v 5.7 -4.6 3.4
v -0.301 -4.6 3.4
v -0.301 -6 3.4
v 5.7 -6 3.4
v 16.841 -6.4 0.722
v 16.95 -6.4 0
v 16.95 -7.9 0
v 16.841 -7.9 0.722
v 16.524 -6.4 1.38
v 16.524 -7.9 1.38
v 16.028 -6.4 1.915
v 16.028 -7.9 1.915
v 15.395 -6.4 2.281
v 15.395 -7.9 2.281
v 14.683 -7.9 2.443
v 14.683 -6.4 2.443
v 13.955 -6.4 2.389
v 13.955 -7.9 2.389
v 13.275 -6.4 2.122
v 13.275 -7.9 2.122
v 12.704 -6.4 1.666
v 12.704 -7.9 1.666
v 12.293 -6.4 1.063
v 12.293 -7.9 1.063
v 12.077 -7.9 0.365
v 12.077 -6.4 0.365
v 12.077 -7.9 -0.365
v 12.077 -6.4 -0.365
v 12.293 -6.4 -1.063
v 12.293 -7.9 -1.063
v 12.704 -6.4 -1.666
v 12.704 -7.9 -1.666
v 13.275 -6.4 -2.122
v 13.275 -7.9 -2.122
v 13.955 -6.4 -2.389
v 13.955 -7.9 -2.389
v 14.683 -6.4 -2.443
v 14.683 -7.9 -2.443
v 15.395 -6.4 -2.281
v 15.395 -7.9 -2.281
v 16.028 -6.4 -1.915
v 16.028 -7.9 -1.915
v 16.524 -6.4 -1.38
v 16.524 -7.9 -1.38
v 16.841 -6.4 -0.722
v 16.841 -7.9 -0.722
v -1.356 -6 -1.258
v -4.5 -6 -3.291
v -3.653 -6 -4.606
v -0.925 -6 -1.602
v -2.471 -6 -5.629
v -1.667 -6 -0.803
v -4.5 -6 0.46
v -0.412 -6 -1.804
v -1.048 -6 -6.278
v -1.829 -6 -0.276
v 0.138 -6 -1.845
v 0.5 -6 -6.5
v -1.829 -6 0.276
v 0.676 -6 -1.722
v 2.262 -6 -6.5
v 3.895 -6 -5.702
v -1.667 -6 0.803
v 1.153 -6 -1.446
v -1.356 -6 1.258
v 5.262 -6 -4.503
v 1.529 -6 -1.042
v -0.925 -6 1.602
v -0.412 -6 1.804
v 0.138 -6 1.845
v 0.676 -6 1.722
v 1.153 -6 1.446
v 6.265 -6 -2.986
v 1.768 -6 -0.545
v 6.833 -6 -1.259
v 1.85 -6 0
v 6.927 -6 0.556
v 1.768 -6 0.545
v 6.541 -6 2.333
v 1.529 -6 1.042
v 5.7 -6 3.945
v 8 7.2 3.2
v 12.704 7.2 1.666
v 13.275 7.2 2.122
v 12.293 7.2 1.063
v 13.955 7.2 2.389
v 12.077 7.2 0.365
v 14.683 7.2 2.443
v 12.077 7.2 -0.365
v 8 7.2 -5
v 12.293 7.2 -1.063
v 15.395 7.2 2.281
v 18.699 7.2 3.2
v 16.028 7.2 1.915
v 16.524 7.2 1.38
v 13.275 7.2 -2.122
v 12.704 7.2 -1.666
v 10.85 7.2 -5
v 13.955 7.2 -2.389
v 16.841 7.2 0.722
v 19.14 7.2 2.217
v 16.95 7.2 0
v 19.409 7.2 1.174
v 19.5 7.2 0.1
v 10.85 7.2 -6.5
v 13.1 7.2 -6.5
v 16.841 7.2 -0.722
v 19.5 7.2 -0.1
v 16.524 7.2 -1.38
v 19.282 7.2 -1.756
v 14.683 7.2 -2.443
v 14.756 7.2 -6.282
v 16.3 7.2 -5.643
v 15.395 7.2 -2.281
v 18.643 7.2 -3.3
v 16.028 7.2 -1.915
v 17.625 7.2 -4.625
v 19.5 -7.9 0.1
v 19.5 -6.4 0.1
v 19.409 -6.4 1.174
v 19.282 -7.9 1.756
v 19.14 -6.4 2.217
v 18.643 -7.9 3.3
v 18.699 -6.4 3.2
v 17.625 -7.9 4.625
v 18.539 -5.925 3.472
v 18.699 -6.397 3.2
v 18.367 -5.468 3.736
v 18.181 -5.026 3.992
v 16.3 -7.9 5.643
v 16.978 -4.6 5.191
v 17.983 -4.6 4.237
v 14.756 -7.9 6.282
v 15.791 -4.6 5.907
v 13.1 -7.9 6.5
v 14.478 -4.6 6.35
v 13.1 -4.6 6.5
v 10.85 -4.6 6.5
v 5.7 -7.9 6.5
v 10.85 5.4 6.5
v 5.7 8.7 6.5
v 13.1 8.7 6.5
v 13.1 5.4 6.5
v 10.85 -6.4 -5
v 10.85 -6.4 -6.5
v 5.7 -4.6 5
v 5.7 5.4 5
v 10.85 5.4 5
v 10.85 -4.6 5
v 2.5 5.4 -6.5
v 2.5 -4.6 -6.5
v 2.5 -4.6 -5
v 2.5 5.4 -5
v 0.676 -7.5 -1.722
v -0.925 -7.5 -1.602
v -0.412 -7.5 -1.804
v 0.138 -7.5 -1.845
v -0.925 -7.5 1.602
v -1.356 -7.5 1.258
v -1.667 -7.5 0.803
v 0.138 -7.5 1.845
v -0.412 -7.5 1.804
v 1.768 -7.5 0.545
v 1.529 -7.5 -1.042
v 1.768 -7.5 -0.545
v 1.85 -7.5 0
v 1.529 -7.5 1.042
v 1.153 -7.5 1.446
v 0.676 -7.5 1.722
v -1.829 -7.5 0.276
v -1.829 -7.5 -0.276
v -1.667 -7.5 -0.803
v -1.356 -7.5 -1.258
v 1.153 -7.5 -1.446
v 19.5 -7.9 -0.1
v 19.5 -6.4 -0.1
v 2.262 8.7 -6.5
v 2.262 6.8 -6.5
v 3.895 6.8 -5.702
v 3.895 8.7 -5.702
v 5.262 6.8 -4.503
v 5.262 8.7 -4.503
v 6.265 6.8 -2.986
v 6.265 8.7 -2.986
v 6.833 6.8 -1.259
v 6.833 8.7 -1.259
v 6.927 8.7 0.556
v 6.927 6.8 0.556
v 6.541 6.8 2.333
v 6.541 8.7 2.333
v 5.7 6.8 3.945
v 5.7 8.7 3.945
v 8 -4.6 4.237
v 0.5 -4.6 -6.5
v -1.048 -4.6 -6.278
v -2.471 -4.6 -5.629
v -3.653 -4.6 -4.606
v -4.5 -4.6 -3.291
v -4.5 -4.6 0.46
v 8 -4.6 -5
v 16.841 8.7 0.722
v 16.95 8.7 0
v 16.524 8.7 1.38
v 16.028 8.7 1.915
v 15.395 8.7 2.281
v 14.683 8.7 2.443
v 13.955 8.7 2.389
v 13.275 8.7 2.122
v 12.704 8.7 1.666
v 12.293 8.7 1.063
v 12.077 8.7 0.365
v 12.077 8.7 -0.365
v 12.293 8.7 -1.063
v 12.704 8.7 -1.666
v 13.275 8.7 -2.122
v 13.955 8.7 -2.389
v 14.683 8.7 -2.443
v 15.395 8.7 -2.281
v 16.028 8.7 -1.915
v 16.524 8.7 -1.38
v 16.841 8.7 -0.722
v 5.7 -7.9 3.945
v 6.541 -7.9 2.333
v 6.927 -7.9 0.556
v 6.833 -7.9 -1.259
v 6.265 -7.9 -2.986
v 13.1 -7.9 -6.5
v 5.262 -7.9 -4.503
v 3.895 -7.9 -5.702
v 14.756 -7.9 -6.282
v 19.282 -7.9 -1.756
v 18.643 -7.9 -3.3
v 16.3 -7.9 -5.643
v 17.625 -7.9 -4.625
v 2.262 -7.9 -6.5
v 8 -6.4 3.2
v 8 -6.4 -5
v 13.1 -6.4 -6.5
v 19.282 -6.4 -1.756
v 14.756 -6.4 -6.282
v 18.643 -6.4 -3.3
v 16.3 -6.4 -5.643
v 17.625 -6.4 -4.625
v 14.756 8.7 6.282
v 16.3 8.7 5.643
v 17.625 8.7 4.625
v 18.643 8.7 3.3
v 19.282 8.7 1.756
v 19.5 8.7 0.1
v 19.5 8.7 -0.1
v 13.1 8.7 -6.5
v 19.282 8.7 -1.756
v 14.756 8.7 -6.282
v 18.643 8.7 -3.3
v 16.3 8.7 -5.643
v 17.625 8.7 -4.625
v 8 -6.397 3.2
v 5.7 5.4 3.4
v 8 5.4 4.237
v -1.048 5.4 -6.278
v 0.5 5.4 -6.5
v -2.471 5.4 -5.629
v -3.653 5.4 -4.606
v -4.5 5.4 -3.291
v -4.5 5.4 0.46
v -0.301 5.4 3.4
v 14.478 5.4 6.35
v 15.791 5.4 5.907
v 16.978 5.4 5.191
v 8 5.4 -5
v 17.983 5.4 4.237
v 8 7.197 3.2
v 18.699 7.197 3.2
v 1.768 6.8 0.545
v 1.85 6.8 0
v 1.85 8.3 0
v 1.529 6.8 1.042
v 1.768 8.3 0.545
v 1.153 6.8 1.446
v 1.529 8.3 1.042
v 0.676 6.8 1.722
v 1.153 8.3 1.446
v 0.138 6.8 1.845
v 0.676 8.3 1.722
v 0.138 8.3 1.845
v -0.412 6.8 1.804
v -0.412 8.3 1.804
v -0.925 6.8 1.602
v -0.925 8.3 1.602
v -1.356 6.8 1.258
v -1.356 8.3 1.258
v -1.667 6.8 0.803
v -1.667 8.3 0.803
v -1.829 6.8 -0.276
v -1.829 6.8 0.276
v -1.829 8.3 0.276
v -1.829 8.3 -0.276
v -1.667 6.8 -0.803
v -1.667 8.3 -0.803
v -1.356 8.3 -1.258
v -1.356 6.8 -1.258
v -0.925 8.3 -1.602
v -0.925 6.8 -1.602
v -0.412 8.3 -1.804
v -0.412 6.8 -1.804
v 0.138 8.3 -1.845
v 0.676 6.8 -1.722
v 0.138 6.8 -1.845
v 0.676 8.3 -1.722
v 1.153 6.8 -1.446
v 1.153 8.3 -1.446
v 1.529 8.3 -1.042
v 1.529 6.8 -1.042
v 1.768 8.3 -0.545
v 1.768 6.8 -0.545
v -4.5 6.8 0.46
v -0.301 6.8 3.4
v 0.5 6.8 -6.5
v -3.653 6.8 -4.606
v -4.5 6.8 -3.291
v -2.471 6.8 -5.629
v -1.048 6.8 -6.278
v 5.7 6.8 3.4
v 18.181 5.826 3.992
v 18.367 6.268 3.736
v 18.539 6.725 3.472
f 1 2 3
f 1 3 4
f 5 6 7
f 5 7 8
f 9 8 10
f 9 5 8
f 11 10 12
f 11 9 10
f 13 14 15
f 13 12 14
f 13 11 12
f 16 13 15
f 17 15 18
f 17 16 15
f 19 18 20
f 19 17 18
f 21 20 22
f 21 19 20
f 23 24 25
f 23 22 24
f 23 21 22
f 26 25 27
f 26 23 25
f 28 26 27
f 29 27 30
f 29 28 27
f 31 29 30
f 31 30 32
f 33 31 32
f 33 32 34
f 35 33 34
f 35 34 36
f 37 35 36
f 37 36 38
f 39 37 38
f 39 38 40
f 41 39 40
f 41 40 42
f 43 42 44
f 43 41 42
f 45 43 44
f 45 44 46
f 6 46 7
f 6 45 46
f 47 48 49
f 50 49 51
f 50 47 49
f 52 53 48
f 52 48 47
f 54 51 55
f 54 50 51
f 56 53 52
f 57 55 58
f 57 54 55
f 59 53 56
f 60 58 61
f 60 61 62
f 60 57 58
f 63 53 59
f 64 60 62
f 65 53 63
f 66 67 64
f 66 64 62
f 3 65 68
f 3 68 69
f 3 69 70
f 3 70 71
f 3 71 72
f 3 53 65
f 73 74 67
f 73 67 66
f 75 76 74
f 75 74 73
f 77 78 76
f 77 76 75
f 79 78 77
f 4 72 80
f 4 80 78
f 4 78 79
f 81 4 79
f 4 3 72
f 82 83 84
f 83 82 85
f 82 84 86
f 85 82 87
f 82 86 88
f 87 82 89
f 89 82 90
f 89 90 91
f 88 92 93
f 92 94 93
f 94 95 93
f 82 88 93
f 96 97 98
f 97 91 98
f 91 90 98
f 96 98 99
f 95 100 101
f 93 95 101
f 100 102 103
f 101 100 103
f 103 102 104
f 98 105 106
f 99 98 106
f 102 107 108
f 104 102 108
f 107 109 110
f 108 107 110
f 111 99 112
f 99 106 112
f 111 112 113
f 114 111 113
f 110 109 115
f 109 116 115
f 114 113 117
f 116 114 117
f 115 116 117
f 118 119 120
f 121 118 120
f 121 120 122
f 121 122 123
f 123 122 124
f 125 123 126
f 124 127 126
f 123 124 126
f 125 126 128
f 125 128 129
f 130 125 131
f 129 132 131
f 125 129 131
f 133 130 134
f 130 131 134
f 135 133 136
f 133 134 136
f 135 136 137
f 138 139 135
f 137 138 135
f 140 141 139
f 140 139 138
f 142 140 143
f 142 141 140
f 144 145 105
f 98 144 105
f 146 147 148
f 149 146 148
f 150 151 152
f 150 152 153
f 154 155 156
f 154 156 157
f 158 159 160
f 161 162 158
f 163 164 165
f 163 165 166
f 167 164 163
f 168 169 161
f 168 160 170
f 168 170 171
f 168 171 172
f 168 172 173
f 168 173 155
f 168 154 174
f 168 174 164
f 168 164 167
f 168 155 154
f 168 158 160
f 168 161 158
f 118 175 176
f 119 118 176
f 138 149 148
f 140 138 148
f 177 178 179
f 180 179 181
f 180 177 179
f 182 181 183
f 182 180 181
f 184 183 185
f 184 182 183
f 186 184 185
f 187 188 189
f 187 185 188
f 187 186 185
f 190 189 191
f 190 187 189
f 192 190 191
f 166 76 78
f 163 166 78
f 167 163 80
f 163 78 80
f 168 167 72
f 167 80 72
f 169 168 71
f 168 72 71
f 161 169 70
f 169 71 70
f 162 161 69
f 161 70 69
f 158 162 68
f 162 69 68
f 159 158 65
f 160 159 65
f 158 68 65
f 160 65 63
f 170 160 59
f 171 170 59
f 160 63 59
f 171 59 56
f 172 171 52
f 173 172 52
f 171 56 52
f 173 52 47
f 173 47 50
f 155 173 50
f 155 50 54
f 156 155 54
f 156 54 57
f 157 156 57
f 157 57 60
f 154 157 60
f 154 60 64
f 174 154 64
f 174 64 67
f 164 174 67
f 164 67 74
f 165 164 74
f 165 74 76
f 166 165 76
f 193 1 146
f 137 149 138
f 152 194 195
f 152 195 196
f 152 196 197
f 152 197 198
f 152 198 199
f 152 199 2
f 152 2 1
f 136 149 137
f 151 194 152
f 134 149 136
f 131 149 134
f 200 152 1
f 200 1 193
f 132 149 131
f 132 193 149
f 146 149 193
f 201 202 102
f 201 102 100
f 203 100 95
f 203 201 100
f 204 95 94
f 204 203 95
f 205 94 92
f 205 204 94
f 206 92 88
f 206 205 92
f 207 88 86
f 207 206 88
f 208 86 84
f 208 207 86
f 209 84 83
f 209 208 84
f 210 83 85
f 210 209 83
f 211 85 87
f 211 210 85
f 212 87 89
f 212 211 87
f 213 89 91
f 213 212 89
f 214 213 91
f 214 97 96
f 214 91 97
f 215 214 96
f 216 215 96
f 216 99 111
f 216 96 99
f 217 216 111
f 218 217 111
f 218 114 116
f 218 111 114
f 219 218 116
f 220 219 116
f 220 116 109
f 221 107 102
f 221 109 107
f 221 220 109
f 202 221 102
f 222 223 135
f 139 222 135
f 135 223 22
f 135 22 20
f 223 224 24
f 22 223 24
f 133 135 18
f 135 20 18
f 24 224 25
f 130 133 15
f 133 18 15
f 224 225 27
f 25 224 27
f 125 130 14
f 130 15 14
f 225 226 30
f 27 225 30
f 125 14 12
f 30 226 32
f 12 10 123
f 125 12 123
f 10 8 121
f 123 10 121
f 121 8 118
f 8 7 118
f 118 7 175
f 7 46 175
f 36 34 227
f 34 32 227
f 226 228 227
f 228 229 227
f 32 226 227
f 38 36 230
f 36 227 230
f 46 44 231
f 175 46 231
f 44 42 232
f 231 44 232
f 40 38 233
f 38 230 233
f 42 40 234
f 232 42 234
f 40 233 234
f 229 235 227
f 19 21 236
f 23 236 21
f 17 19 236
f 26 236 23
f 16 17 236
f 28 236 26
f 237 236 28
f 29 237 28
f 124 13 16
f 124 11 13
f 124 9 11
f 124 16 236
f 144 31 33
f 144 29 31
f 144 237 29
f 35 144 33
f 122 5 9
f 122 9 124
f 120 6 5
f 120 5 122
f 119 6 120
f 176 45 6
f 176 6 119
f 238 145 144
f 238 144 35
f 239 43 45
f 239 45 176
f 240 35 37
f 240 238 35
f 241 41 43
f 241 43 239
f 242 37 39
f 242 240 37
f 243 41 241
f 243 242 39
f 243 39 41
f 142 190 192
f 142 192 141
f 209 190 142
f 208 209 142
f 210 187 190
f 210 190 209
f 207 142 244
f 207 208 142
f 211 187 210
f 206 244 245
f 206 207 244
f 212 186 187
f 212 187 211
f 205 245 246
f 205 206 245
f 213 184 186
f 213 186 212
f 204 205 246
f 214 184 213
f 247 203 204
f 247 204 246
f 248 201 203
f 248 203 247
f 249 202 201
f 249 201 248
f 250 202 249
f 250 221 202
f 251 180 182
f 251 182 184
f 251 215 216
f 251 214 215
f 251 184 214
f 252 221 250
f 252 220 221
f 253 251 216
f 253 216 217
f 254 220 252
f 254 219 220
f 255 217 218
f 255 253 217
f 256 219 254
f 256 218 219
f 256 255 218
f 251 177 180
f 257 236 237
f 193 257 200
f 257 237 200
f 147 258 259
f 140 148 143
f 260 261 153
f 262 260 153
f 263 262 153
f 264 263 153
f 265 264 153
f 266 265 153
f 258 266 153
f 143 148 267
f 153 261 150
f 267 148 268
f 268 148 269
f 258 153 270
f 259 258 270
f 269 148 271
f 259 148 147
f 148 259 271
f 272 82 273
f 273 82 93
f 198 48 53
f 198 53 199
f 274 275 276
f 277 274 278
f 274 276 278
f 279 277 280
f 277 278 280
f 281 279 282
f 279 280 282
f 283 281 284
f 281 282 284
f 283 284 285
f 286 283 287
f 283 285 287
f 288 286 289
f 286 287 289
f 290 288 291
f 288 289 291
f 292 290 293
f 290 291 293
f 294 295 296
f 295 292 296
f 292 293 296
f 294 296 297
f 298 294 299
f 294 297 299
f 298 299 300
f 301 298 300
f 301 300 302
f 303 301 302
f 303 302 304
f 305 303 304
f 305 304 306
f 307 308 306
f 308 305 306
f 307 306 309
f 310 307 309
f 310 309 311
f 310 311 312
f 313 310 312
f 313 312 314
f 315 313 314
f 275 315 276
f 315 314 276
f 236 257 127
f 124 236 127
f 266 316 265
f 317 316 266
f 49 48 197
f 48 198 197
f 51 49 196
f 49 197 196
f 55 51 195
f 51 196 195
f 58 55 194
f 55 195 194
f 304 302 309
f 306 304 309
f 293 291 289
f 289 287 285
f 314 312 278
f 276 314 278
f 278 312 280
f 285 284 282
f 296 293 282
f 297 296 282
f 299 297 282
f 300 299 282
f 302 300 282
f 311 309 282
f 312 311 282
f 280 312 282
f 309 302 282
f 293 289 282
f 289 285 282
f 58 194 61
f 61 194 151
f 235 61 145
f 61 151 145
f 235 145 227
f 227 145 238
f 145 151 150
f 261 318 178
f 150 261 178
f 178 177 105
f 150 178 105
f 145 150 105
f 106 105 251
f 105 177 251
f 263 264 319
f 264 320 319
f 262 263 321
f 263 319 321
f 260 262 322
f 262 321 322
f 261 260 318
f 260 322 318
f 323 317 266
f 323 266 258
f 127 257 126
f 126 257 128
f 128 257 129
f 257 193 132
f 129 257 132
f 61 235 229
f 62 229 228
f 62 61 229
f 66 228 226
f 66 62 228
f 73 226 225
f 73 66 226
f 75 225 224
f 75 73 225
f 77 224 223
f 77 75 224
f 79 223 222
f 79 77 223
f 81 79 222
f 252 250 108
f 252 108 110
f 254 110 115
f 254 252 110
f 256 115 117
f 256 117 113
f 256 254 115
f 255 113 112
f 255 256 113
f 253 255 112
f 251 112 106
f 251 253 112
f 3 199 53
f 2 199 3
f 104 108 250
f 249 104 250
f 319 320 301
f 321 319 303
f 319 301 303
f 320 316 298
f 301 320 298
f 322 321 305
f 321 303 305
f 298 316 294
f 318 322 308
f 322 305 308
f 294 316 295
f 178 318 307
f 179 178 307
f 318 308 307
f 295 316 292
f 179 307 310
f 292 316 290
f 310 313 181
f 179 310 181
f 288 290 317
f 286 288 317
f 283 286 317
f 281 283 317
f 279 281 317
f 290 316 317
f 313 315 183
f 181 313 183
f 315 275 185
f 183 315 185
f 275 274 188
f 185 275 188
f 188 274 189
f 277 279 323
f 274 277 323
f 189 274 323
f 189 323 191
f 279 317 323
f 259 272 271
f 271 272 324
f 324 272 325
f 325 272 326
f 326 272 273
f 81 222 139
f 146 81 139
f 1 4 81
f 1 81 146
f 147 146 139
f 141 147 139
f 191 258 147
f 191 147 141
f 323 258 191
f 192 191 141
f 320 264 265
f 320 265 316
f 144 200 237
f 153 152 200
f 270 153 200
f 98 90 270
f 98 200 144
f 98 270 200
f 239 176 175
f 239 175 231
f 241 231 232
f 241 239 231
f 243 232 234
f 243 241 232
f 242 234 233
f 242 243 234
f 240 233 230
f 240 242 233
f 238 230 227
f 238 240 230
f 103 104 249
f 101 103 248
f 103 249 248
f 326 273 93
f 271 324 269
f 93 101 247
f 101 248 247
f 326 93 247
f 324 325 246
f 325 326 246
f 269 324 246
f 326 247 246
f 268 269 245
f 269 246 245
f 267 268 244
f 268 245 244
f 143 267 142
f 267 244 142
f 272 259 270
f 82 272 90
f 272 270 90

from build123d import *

# Parameters (mm, degrees)
BOX010_W               = 11
BOX010_H               = 3
BOX010_DEPTH           = 3
BOX010_PLACEMENT_ANGLE = 60.000023
BOX004_W               = 26
BOX004_H               = 10
BOX004_DEPTH           = 10
BOX005_W               = 8
BOX005_H               = 10
BOX005_DEPTH           = 13
BOX006_W               = 10
BOX006_H               = 13.6
BOX006_DEPTH           = 9.7
BOX007_W               = 6
BOX007_H               = 13.6
BOX007_DEPTH           = 8.2
BOX008_W               = 8
BOX008_H               = 10
BOX008_DEPTH           = 10
BOX009_W               = 11
BOX009_H               = 3
BOX009_DEPTH           = 3
BOX009_PLACEMENT_ANGLE = 29.99999
CYLINDER012024_R       = 1.85
CYLINDER012024_DEPTH   = 15.8
CYLINDER012026_R       = 5.5
CYLINDER012026_DEPTH   = 17.5
BOX003_W               = 5
BOX003_H               = 17.5
BOX003_DEPTH           = 4
BOX001_W               = 7
BOX001_H               = 18
BOX001_DEPTH           = 4
CYLINDER012025_R       = 6.85
CYLINDER012025_DEPTH   = 3
CYLINDER012023_R       = 2.45
CYLINDER012023_DEPTH   = 17.5
CYLINDER012022_R       = 6.85
CYLINDER012022_DEPTH   = 3
BOX002_W               = 9
BOX002_H               = 18
BOX002_DEPTH           = 5
BOX002_PLACEMENT_ANGLE = 35.00002
BOX_W                  = 24
BOX_H                  = 16.6
BOX_DEPTH              = 13
FILLET_R               = 6.4


with BuildPart() as box010:
    # Box010 → Box010 (new body)
    with BuildSketch(Plane.XY):
        with Locations((5.5, 1.5)):
            Rectangle(BOX010_W, BOX010_H)
    extrude(amount=BOX010_DEPTH)


with BuildPart() as box010_1:
    # Box010 placement: moved
    add(box010.part.moved(Location((12.5, 13.7, 7.1))).rotate(Axis((12.5, 13.7, 7.1), (1, 0, 0)), BOX010_PLACEMENT_ANGLE))


with BuildPart() as box004:
    # Box004 → Box004 (new body)
    with BuildSketch(Plane(origin=(-1, 3.4, 1.5), x_dir=(1, 0, 0), z_dir=(0, 0, 1))):
        with Locations((13, 5)):
            Rectangle(BOX004_W, BOX004_H)
    extrude(amount=BOX004_DEPTH)


with BuildPart() as box005:
    # Box005 → Box005 (new body)
    with BuildSketch(Plane(origin=(-1, 3.4, -1.5), x_dir=(1, 0, 0), z_dir=(0, 0, 1))):
        with Locations((4, 5)):
            Rectangle(BOX005_W, BOX005_H)
    extrude(amount=BOX005_DEPTH)


with BuildPart() as box006:
    # Box006 → Box006 (new body)
    with BuildSketch(Plane(origin=(15.35, 1.6, 0), x_dir=(1, 0, 0), z_dir=(0, 0, 1))):
        with Locations((5, 6.8)):
            Rectangle(BOX006_W, BOX006_H)
    extrude(amount=BOX006_DEPTH)


with BuildPart() as box007:
    # Box007 → Box007 (new body)
    with BuildSketch(Plane(origin=(12.5, 1.6, 1.5), x_dir=(1, 0, 0), z_dir=(0, 0, 1))):
        with Locations((3, 6.8)):
            Rectangle(BOX007_W, BOX007_H)
    extrude(amount=BOX007_DEPTH)


with BuildPart() as box008:
    # Box008 → Box008 (new body)
    with BuildSketch(Plane(origin=(15.35, 3.4, 3.5), x_dir=(1, 0, 0), z_dir=(0, 0, 1))):
        with Locations((4, 5)):
            Rectangle(BOX008_W, BOX008_H)
    extrude(amount=BOX008_DEPTH)


with BuildPart() as fusion011:
    # Box009 → Box009 (new body)
    with BuildSketch(Plane.XY):
        with Locations((5.5, 1.5)):
            Rectangle(BOX009_W, BOX009_H)
    extrude(amount=BOX009_DEPTH)


with BuildPart() as fusion011_1:
    # Box009 placement: moved
    add(fusion011.part.moved(Location((12.5, 3.1, 7.1))).rotate(Axis((12.5, 3.1, 7.1), (1, 0, 0)), BOX009_PLACEMENT_ANGLE))

    # Fusion011: union Box010, Box004, Box005, Box006, Box007, Box008
    add(box010_1.part)
    add(box004.part)
    add(box005.part)
    add(box006.part)
    add(box007.part)
    add(box008.part)


with BuildPart() as cylinder012024:
    # Cylinder012024 → Cylinder012024 (new body)
    with BuildSketch(Plane(origin=(4.5, 16.3, 6.5), x_dir=(1, 0, 0), z_dir=(0, -1, 0))):
        Circle(CYLINDER012024_R)
    extrude(amount=CYLINDER012024_DEPTH)


with BuildPart() as cylinder012026:
    # Cylinder012026 → Cylinder012026 (new body)
    with BuildSketch(Plane(origin=(5, 17, 5.5), x_dir=(1, 0, 0), z_dir=(0, -1, 0))):
        Circle(CYLINDER012026_R)
    extrude(amount=CYLINDER012026_DEPTH)


with BuildPart() as cut003004:
    # Box003 → Box003 (new body)
    with BuildSketch(Plane(origin=(0, -0.5, 0), x_dir=(1, 0, 0), z_dir=(0, 0, 1))):
        with Locations((2.5, 8.75)):
            Rectangle(BOX003_W, BOX003_H)
    extrude(amount=BOX003_DEPTH)

    # Cut003004: cut Cylinder012026
    add(cylinder012026.part, mode=Mode.SUBTRACT)


with BuildPart() as box001:
    # Box001 → Box001 (new body)
    with BuildSketch(Plane(origin=(3.2, -1, 9.9), x_dir=(1, 0, 0), z_dir=(0, 0, 1))):
        with Locations((3.5, 9)):
            Rectangle(BOX001_W, BOX001_H)
    extrude(amount=BOX001_DEPTH)


with BuildPart() as cylinder012025:
    # Cylinder012025 → Cylinder012025 (new body)
    with BuildSketch(Plane(origin=(4.6, 2, 6.5), x_dir=(1, 0, 0), z_dir=(0, -1, 0))):
        Circle(CYLINDER012025_R)
    extrude(amount=CYLINDER012025_DEPTH)


with BuildPart() as cylinder012023:
    # Cylinder012023 → Cylinder012023 (new body)
    with BuildSketch(Plane(origin=(19, 17, 6.5), x_dir=(1, 0, 0), z_dir=(0, -1, 0))):
        Circle(CYLINDER012023_R)
    extrude(amount=CYLINDER012023_DEPTH)


with BuildPart() as cylinder012022:
    # Cylinder012022 → Cylinder012022 (new body)
    with BuildSketch(Plane(origin=(4.6, 17.8, 6.5), x_dir=(1, 0, 0), z_dir=(0, -1, 0))):
        Circle(CYLINDER012022_R)
    extrude(amount=CYLINDER012022_DEPTH)


with BuildPart() as fusion012:
    # Box002 → Box002 (new body)
    with BuildSketch(Plane.XY):
        with Locations((4.5, 9)):
            Rectangle(BOX002_W, BOX002_H)
    extrude(amount=BOX002_DEPTH)


with BuildPart() as fusion012_1:
    # Box002 placement: moved
    add(fusion012.part.moved(Location((-0.8, -1, 6.4))).rotate(Axis((-0.8, -1, 6.4), (0, -1, 0)), BOX002_PLACEMENT_ANGLE))

    # Fusion010: union Box001, Cylinder012025, Cylinder012023, Cylinder012022
    add(box001.part)
    add(cylinder012025.part)
    add(cylinder012023.part)
    add(cylinder012022.part)

    # Fusion012: union Cut003004
    add(cut003004.part)


with BuildPart() as pieza:
    # Box → Box (new body)
    with BuildSketch(Plane(origin=(0, 0.1, 0), x_dir=(1, 0, 0), z_dir=(0, 0, 1))):
        with Locations((12, 8.3)):
            Rectangle(BOX_W, BOX_H)
    extrude(amount=BOX_DEPTH)

    # Fillet
    fillet_edges = [pieza.edges().sort_by_distance(p)[0] for p in [
        (24, 8.4, 13),
        (24, 8.4, 0),
    ]]
    fillet(fillet_edges, radius=FILLET_R)

    # Cut003005: cut Fusion012
    add(fusion012_1.part, mode=Mode.SUBTRACT)

    # Fusion013: union Cylinder012024
    add(cylinder012024.part)

    # Cut002007: cut Fusion011
    add(fusion011_1.part, mode=Mode.SUBTRACT)


with BuildPart() as pieza_1:
    # Cut002007 placement: moved
    add(pieza.part.moved(Location((-4.5, -8, -6.5))))


solid = pieza_1.part
